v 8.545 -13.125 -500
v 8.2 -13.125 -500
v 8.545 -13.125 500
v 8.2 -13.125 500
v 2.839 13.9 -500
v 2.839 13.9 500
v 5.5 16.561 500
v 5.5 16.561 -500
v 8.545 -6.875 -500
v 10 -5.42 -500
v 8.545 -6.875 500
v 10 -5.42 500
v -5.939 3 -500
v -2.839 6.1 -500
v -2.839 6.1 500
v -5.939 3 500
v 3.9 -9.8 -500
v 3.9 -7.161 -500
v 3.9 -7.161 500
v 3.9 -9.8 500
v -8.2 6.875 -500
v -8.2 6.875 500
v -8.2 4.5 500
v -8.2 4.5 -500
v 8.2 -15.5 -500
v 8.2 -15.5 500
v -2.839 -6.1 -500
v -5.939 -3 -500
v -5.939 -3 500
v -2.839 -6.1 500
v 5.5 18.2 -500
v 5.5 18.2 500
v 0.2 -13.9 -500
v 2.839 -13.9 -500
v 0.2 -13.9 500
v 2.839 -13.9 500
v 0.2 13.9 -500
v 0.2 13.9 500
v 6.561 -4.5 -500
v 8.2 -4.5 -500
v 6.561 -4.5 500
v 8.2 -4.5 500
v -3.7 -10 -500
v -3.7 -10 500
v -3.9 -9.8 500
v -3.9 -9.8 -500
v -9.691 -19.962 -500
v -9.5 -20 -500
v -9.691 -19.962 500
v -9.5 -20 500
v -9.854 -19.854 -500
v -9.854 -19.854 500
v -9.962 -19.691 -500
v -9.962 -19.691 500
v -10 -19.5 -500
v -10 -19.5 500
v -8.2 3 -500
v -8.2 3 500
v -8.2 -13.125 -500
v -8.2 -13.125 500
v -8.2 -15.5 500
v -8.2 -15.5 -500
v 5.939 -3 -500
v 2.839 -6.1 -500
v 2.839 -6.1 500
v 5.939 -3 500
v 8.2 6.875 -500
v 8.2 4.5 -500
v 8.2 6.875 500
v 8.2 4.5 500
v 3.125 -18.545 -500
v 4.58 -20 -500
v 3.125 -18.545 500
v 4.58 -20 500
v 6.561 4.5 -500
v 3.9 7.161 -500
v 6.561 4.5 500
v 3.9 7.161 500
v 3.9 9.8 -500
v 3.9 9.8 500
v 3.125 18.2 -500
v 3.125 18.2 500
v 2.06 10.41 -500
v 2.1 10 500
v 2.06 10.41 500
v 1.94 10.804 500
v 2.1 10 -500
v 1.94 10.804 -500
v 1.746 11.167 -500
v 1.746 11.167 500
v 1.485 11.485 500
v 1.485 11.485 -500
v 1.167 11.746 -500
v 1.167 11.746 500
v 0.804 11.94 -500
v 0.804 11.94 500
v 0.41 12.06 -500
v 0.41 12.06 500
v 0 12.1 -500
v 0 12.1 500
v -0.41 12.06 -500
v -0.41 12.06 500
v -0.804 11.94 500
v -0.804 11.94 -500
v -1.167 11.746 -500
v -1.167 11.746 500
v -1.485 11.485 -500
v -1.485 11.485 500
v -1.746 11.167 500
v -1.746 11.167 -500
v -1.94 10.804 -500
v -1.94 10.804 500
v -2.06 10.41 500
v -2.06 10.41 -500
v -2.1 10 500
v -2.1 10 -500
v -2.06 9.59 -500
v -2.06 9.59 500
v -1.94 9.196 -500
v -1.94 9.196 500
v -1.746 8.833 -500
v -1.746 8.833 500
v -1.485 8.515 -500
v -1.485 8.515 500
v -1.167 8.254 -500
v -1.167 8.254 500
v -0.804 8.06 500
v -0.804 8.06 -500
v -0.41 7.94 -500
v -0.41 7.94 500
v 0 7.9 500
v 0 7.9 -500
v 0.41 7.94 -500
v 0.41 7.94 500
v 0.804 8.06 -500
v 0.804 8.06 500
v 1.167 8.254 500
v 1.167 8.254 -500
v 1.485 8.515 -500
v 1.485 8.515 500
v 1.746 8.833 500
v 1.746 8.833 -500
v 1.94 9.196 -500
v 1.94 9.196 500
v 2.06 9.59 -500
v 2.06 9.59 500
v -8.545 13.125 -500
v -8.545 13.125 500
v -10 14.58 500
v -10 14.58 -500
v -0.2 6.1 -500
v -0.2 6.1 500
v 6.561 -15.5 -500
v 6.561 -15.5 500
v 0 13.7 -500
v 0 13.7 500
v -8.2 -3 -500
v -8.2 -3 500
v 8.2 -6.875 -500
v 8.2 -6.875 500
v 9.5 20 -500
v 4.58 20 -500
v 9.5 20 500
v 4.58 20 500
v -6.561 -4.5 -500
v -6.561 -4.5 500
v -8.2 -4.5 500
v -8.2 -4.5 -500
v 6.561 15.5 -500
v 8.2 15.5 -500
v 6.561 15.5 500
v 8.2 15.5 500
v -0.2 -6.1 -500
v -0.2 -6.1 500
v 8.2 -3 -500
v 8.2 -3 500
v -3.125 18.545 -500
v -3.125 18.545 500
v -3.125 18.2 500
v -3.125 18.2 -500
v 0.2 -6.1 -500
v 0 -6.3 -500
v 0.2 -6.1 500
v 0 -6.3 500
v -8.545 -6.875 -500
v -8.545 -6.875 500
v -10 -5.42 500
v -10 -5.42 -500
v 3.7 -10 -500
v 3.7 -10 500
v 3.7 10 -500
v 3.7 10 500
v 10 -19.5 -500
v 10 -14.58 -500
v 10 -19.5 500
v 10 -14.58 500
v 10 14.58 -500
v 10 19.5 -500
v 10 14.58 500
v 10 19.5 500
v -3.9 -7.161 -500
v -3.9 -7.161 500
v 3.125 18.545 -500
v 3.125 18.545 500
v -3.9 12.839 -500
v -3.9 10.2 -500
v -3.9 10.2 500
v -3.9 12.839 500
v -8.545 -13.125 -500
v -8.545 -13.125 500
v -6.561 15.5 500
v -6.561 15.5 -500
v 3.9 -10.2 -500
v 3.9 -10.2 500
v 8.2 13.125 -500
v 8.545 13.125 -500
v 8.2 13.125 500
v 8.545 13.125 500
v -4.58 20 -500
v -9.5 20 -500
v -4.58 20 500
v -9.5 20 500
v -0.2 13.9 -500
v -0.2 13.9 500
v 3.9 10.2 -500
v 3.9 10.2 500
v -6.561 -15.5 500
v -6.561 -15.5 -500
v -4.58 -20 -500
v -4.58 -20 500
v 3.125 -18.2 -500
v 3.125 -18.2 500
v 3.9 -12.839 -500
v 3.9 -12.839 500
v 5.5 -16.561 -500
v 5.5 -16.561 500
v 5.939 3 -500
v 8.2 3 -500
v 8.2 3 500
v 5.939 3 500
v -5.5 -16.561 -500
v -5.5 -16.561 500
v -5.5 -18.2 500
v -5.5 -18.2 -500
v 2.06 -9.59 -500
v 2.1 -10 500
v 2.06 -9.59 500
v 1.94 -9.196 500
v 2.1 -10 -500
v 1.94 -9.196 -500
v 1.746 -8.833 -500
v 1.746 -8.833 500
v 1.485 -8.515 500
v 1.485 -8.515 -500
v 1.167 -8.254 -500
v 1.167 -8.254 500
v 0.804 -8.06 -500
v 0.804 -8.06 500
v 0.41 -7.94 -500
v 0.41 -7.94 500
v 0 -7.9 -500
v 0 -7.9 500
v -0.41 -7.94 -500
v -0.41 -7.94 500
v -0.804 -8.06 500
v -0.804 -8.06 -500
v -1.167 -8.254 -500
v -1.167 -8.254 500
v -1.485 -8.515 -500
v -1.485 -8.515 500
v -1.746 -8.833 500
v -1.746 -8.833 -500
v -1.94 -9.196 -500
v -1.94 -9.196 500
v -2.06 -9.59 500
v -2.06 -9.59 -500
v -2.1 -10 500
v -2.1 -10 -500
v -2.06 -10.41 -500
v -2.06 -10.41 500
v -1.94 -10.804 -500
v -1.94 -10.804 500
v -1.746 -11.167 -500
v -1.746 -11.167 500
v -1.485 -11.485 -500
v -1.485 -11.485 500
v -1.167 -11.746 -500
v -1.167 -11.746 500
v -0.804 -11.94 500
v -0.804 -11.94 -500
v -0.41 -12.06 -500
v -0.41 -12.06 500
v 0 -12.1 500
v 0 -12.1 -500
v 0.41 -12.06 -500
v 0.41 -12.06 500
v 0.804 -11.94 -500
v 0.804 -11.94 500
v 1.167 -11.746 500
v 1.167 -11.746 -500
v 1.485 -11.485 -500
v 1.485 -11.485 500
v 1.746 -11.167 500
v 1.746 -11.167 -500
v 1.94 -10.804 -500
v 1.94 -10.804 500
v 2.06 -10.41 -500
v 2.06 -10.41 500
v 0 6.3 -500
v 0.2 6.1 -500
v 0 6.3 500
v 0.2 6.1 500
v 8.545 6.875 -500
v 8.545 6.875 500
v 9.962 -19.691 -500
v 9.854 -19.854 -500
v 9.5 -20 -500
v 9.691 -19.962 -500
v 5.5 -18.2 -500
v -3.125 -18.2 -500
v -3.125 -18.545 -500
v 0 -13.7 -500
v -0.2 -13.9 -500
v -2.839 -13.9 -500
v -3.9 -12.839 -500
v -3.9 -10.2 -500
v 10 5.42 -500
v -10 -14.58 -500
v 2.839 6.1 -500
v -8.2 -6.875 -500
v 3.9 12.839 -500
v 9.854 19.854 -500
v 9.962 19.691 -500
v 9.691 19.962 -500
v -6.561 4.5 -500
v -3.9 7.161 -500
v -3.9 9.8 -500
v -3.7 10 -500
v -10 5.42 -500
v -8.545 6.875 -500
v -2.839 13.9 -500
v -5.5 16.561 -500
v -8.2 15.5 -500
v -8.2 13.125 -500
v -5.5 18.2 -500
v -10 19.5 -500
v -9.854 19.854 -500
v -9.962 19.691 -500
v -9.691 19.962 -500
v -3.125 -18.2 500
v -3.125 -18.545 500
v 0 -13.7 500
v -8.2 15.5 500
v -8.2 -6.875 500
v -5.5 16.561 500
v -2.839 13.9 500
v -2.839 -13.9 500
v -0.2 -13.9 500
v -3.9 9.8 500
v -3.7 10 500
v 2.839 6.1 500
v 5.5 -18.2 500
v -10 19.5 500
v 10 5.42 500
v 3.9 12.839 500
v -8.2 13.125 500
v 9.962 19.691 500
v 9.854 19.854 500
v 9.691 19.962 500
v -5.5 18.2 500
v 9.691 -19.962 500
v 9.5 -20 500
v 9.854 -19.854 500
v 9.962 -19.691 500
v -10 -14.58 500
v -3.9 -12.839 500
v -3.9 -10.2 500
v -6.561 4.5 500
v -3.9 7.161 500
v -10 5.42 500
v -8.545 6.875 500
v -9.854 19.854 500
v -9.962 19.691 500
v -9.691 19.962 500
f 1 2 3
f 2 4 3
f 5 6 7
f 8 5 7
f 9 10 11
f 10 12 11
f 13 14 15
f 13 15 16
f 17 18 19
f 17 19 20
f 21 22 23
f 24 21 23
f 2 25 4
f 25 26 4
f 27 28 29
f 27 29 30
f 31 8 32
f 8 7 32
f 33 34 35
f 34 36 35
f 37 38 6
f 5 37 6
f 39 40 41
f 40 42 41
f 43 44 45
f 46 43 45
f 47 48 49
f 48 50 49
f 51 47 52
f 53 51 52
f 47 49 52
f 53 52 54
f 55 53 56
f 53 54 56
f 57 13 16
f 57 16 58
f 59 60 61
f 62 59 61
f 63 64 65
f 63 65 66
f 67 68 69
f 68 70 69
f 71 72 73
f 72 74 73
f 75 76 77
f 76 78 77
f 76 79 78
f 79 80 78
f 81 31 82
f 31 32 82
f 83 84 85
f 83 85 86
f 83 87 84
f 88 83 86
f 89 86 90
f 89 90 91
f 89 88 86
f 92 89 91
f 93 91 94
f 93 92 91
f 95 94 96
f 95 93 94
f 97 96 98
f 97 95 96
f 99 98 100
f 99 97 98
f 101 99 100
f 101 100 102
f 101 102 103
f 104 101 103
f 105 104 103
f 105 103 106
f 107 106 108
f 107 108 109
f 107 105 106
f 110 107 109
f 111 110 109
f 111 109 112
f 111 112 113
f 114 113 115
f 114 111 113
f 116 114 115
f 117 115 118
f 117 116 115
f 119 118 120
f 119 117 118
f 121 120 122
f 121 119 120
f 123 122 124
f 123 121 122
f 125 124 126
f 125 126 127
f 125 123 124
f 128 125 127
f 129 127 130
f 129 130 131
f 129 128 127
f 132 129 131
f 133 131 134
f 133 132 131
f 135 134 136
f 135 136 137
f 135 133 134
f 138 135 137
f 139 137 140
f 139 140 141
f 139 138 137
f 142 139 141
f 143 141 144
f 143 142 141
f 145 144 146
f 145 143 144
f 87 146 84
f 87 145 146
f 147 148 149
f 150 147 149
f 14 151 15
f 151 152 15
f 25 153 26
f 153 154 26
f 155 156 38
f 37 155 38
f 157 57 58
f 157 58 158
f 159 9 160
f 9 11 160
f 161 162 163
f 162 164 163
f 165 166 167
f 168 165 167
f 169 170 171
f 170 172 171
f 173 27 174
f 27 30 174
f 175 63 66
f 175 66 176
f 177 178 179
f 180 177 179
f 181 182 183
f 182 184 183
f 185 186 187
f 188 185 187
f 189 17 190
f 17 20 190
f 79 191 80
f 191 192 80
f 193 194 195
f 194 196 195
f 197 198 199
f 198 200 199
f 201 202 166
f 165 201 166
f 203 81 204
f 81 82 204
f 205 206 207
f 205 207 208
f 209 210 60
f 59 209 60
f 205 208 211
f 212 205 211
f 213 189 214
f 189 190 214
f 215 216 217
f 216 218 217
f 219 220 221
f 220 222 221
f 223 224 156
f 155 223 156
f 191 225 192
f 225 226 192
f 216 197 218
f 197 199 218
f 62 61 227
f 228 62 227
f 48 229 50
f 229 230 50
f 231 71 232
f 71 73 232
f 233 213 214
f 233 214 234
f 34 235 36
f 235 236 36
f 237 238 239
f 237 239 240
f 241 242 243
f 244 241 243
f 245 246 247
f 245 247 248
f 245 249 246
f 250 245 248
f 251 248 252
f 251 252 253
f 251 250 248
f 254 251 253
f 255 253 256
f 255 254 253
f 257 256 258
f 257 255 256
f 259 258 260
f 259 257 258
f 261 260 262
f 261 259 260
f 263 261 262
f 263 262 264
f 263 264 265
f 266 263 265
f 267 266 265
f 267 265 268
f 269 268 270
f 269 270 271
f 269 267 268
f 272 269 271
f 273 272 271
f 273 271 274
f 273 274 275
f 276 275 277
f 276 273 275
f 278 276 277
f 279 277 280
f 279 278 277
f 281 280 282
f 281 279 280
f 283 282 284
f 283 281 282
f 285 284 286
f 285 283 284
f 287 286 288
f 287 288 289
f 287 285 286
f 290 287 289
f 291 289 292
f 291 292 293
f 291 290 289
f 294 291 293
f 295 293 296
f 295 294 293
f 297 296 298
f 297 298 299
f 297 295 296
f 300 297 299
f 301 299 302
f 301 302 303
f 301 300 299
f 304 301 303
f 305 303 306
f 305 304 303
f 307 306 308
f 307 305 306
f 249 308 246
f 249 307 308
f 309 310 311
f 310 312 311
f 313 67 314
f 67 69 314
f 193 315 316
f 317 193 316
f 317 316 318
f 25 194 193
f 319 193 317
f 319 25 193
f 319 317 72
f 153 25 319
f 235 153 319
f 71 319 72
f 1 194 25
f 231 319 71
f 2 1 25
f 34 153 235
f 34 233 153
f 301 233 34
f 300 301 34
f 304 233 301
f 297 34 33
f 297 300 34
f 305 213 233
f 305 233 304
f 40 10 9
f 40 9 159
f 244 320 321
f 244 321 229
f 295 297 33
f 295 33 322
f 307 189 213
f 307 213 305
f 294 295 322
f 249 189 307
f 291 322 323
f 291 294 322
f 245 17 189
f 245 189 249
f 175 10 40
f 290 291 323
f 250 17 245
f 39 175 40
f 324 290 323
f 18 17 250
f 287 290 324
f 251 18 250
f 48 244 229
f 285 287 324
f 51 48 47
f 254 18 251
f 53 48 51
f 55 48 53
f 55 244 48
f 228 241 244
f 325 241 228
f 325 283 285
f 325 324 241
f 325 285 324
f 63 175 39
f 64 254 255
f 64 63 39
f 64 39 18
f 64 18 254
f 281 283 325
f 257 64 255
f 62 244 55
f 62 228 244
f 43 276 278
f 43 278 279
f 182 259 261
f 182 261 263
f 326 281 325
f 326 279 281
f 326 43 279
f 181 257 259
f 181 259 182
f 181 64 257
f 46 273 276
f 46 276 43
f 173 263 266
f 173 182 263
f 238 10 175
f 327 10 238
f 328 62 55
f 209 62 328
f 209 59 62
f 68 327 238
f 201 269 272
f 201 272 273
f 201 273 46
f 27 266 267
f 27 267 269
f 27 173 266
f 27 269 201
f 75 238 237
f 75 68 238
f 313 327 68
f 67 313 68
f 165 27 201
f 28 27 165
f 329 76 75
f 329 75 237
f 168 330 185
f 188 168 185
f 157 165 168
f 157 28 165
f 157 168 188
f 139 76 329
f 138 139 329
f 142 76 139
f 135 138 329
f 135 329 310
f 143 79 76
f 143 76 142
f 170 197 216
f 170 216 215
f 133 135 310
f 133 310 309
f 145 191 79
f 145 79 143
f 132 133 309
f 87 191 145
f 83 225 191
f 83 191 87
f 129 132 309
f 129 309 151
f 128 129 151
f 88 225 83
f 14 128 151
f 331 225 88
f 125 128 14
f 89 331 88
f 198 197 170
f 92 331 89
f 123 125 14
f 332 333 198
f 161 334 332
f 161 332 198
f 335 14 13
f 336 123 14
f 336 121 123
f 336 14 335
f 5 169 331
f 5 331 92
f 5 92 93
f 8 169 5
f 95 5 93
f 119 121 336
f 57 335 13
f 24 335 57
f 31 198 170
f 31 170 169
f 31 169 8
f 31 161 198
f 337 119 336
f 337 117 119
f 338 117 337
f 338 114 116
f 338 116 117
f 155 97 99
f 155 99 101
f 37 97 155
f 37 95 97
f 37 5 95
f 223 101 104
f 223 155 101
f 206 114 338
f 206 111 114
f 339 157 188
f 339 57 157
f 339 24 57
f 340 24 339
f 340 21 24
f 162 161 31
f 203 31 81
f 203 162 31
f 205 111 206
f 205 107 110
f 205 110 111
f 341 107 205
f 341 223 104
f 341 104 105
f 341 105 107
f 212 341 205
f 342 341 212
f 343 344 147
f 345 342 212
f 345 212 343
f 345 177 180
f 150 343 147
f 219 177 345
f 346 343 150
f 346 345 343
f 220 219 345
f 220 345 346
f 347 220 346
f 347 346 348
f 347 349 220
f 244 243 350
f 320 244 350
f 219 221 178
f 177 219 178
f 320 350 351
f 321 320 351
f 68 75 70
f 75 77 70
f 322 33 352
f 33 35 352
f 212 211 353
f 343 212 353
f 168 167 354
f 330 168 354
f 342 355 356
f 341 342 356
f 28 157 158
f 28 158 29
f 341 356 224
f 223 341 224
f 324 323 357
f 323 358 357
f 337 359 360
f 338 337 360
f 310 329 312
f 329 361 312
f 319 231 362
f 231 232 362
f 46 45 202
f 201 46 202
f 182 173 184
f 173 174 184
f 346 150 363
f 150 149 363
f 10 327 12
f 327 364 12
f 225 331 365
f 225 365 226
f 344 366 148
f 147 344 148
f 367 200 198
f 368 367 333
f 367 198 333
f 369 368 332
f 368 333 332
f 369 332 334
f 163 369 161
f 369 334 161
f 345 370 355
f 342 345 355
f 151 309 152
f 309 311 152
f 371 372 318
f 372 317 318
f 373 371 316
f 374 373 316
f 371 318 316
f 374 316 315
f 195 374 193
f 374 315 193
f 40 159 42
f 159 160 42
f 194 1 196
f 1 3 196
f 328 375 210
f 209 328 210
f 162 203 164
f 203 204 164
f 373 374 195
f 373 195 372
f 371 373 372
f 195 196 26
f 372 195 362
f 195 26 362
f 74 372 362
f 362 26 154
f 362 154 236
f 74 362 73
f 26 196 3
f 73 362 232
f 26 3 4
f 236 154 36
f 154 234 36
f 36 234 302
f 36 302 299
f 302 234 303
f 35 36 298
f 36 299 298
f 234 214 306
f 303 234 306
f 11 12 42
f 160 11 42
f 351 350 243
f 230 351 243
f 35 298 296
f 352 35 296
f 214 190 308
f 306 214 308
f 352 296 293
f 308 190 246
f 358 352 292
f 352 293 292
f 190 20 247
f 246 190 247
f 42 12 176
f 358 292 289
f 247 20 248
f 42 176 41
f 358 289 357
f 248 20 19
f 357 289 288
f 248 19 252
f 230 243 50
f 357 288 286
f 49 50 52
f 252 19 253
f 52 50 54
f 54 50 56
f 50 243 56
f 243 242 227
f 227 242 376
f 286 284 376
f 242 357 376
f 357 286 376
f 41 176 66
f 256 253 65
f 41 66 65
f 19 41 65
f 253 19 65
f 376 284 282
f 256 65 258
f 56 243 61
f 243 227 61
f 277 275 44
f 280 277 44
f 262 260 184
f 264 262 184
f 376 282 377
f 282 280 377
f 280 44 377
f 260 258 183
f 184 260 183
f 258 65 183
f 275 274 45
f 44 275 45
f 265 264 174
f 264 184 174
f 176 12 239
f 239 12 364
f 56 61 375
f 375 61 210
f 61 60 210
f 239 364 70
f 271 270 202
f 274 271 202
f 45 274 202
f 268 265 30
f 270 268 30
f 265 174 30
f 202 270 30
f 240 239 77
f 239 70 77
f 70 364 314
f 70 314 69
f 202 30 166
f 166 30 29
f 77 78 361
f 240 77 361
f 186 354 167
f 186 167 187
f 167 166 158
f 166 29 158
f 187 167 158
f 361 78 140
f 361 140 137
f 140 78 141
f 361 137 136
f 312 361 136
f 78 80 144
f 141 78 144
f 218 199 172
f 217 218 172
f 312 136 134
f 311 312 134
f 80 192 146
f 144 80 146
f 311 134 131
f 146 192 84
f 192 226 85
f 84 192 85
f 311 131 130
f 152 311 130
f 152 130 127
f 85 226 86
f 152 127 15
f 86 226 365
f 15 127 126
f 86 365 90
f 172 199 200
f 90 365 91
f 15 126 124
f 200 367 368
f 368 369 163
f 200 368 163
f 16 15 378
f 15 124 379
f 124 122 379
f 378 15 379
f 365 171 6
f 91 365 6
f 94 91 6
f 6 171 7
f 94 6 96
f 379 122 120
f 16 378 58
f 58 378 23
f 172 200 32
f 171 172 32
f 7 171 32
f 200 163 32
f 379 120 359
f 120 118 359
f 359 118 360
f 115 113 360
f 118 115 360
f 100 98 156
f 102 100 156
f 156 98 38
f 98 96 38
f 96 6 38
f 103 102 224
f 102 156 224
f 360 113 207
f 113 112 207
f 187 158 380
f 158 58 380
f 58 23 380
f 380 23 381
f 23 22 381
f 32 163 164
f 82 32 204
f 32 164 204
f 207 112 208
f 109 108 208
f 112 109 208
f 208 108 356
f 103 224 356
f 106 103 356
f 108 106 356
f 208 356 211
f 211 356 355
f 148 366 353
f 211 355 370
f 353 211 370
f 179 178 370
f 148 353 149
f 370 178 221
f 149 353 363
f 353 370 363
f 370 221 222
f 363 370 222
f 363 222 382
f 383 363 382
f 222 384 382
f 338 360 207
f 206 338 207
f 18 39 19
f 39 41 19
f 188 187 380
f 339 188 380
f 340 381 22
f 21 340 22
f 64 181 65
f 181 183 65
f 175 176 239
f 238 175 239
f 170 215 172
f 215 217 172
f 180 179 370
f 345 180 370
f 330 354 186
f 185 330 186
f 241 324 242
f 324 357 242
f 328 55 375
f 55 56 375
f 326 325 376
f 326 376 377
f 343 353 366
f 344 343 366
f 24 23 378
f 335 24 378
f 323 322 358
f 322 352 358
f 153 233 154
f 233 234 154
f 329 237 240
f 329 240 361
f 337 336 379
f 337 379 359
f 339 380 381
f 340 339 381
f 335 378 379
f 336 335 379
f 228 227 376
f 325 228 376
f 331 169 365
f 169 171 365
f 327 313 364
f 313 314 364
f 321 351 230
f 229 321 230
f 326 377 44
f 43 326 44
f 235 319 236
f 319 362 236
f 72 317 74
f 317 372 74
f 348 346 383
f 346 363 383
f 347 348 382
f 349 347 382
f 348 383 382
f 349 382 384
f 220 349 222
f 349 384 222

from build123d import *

# Parameters (mm, degrees)
SKETCH1_R           = 2.1
BOSS_EXTRUDE1_DEPTH = 500
FILLET1_R           = 0.5


with BuildPart() as part:
    # Sketch1 → Boss-Extrude1 (new body, symmetric)
    with BuildSketch(Plane.XY):
        Polygon((2.839339828, 13.9), (5.5, 16.560660172), (5.5, 18.2), (3.125, 18.2), (3.125, 18.545), (4.58, 20), (10, 20), (10, 14.58), (8.545, 13.125), (8.2, 13.125), (8.2, 15.5), (6.560660172, 15.5), (3.9, 12.839339828), (3.9, 10.2), (3.7, 10), (3.9, 9.8), (3.9, 7.160660172), (6.560660172, 4.5), (8.2, 4.5), (8.2, 6.875), (8.545, 6.875), (10, 5.42), (10, -5.42), (8.545, -6.875), (8.2, -6.875), (8.2, -4.5), (6.560660172, -4.5), (3.9, -7.160660172), (3.9, -9.8), (3.7, -10), (3.9, -10.2), (3.9, -12.839339828), (6.560660172, -15.5), (8.2, -15.5), (8.2, -13.125), (8.545, -13.125), (10, -14.58), (10, -20), (4.58, -20), (3.125, -18.545), (3.125, -18.2), (5.5, -18.2), (5.5, -16.560660172), (2.839339828, -13.9), (0.2, -13.9), (0, -13.7), (-0.2, -13.9), (-2.839339828, -13.9), (-5.5, -16.560660172), (-5.5, -18.2), (-3.125, -18.2), (-3.125, -18.545), (-4.58, -20), (-10, -20), (-10, -14.58), (-8.545, -13.125), (-8.2, -13.125), (-8.2, -15.5), (-6.560660172, -15.5), (-3.9, -12.839339828), (-3.9, -10.2), (-3.7, -10), (-3.9, -9.8), (-3.9, -7.160660172), (-6.560660172, -4.5), (-8.2, -4.5), (-8.2, -6.875), (-8.545, -6.875), (-10, -5.42), (-10, 5.42), (-8.545, 6.875), (-8.2, 6.875), (-8.2, 4.5), (-6.560660172, 4.5), (-3.9, 7.160660172), (-3.9, 9.8), (-3.7, 10), (-3.9, 10.2), (-3.9, 12.839339828), (-6.560660172, 15.5), (-8.2, 15.5), (-8.2, 13.125), (-8.545, 13.125), (-10, 14.58), (-10, 20), (-4.58, 20), (-3.125, 18.545), (-3.125, 18.2), (-5.5, 18.2), (-5.5, 16.560660172), (-2.839339828, 13.9), (-0.2, 13.9), (0, 13.7), (0.2, 13.9), align=None)
        with Locations((0, 10)):
            Circle(SKETCH1_R, mode=Mode.SUBTRACT)
        with Locations((0, -10)):
            Circle(SKETCH1_R, mode=Mode.SUBTRACT)
        Polygon((8.2, -3), (8.2, 3), (5.939339828, 3), (2.839339828, 6.1), (0.2, 6.1), (0, 6.3), (-0.2, 6.1), (-2.839339828, 6.1), (-5.939339828, 3), (-8.2, 3), (-8.2, -3), (-5.939339828, -3), (-2.839339828, -6.1), (-0.2, -6.1), (0, -6.3), (0.2, -6.1), (2.839339828, -6.1), (5.939339828, -3), align=None, mode=Mode.SUBTRACT)
    extrude(amount=BOSS_EXTRUDE1_DEPTH, both=True)

    # Fillet1
    fillet1_edges = [part.edges().sort_by_distance(p)[0] for p in [
        (10, -20, 0),
        (-10, -20, 0),
        (-10, 20, 0),
        (10, 20, 0),
    ]]
    fillet(fillet1_edges, radius=FILLET1_R)


solid = part.part
